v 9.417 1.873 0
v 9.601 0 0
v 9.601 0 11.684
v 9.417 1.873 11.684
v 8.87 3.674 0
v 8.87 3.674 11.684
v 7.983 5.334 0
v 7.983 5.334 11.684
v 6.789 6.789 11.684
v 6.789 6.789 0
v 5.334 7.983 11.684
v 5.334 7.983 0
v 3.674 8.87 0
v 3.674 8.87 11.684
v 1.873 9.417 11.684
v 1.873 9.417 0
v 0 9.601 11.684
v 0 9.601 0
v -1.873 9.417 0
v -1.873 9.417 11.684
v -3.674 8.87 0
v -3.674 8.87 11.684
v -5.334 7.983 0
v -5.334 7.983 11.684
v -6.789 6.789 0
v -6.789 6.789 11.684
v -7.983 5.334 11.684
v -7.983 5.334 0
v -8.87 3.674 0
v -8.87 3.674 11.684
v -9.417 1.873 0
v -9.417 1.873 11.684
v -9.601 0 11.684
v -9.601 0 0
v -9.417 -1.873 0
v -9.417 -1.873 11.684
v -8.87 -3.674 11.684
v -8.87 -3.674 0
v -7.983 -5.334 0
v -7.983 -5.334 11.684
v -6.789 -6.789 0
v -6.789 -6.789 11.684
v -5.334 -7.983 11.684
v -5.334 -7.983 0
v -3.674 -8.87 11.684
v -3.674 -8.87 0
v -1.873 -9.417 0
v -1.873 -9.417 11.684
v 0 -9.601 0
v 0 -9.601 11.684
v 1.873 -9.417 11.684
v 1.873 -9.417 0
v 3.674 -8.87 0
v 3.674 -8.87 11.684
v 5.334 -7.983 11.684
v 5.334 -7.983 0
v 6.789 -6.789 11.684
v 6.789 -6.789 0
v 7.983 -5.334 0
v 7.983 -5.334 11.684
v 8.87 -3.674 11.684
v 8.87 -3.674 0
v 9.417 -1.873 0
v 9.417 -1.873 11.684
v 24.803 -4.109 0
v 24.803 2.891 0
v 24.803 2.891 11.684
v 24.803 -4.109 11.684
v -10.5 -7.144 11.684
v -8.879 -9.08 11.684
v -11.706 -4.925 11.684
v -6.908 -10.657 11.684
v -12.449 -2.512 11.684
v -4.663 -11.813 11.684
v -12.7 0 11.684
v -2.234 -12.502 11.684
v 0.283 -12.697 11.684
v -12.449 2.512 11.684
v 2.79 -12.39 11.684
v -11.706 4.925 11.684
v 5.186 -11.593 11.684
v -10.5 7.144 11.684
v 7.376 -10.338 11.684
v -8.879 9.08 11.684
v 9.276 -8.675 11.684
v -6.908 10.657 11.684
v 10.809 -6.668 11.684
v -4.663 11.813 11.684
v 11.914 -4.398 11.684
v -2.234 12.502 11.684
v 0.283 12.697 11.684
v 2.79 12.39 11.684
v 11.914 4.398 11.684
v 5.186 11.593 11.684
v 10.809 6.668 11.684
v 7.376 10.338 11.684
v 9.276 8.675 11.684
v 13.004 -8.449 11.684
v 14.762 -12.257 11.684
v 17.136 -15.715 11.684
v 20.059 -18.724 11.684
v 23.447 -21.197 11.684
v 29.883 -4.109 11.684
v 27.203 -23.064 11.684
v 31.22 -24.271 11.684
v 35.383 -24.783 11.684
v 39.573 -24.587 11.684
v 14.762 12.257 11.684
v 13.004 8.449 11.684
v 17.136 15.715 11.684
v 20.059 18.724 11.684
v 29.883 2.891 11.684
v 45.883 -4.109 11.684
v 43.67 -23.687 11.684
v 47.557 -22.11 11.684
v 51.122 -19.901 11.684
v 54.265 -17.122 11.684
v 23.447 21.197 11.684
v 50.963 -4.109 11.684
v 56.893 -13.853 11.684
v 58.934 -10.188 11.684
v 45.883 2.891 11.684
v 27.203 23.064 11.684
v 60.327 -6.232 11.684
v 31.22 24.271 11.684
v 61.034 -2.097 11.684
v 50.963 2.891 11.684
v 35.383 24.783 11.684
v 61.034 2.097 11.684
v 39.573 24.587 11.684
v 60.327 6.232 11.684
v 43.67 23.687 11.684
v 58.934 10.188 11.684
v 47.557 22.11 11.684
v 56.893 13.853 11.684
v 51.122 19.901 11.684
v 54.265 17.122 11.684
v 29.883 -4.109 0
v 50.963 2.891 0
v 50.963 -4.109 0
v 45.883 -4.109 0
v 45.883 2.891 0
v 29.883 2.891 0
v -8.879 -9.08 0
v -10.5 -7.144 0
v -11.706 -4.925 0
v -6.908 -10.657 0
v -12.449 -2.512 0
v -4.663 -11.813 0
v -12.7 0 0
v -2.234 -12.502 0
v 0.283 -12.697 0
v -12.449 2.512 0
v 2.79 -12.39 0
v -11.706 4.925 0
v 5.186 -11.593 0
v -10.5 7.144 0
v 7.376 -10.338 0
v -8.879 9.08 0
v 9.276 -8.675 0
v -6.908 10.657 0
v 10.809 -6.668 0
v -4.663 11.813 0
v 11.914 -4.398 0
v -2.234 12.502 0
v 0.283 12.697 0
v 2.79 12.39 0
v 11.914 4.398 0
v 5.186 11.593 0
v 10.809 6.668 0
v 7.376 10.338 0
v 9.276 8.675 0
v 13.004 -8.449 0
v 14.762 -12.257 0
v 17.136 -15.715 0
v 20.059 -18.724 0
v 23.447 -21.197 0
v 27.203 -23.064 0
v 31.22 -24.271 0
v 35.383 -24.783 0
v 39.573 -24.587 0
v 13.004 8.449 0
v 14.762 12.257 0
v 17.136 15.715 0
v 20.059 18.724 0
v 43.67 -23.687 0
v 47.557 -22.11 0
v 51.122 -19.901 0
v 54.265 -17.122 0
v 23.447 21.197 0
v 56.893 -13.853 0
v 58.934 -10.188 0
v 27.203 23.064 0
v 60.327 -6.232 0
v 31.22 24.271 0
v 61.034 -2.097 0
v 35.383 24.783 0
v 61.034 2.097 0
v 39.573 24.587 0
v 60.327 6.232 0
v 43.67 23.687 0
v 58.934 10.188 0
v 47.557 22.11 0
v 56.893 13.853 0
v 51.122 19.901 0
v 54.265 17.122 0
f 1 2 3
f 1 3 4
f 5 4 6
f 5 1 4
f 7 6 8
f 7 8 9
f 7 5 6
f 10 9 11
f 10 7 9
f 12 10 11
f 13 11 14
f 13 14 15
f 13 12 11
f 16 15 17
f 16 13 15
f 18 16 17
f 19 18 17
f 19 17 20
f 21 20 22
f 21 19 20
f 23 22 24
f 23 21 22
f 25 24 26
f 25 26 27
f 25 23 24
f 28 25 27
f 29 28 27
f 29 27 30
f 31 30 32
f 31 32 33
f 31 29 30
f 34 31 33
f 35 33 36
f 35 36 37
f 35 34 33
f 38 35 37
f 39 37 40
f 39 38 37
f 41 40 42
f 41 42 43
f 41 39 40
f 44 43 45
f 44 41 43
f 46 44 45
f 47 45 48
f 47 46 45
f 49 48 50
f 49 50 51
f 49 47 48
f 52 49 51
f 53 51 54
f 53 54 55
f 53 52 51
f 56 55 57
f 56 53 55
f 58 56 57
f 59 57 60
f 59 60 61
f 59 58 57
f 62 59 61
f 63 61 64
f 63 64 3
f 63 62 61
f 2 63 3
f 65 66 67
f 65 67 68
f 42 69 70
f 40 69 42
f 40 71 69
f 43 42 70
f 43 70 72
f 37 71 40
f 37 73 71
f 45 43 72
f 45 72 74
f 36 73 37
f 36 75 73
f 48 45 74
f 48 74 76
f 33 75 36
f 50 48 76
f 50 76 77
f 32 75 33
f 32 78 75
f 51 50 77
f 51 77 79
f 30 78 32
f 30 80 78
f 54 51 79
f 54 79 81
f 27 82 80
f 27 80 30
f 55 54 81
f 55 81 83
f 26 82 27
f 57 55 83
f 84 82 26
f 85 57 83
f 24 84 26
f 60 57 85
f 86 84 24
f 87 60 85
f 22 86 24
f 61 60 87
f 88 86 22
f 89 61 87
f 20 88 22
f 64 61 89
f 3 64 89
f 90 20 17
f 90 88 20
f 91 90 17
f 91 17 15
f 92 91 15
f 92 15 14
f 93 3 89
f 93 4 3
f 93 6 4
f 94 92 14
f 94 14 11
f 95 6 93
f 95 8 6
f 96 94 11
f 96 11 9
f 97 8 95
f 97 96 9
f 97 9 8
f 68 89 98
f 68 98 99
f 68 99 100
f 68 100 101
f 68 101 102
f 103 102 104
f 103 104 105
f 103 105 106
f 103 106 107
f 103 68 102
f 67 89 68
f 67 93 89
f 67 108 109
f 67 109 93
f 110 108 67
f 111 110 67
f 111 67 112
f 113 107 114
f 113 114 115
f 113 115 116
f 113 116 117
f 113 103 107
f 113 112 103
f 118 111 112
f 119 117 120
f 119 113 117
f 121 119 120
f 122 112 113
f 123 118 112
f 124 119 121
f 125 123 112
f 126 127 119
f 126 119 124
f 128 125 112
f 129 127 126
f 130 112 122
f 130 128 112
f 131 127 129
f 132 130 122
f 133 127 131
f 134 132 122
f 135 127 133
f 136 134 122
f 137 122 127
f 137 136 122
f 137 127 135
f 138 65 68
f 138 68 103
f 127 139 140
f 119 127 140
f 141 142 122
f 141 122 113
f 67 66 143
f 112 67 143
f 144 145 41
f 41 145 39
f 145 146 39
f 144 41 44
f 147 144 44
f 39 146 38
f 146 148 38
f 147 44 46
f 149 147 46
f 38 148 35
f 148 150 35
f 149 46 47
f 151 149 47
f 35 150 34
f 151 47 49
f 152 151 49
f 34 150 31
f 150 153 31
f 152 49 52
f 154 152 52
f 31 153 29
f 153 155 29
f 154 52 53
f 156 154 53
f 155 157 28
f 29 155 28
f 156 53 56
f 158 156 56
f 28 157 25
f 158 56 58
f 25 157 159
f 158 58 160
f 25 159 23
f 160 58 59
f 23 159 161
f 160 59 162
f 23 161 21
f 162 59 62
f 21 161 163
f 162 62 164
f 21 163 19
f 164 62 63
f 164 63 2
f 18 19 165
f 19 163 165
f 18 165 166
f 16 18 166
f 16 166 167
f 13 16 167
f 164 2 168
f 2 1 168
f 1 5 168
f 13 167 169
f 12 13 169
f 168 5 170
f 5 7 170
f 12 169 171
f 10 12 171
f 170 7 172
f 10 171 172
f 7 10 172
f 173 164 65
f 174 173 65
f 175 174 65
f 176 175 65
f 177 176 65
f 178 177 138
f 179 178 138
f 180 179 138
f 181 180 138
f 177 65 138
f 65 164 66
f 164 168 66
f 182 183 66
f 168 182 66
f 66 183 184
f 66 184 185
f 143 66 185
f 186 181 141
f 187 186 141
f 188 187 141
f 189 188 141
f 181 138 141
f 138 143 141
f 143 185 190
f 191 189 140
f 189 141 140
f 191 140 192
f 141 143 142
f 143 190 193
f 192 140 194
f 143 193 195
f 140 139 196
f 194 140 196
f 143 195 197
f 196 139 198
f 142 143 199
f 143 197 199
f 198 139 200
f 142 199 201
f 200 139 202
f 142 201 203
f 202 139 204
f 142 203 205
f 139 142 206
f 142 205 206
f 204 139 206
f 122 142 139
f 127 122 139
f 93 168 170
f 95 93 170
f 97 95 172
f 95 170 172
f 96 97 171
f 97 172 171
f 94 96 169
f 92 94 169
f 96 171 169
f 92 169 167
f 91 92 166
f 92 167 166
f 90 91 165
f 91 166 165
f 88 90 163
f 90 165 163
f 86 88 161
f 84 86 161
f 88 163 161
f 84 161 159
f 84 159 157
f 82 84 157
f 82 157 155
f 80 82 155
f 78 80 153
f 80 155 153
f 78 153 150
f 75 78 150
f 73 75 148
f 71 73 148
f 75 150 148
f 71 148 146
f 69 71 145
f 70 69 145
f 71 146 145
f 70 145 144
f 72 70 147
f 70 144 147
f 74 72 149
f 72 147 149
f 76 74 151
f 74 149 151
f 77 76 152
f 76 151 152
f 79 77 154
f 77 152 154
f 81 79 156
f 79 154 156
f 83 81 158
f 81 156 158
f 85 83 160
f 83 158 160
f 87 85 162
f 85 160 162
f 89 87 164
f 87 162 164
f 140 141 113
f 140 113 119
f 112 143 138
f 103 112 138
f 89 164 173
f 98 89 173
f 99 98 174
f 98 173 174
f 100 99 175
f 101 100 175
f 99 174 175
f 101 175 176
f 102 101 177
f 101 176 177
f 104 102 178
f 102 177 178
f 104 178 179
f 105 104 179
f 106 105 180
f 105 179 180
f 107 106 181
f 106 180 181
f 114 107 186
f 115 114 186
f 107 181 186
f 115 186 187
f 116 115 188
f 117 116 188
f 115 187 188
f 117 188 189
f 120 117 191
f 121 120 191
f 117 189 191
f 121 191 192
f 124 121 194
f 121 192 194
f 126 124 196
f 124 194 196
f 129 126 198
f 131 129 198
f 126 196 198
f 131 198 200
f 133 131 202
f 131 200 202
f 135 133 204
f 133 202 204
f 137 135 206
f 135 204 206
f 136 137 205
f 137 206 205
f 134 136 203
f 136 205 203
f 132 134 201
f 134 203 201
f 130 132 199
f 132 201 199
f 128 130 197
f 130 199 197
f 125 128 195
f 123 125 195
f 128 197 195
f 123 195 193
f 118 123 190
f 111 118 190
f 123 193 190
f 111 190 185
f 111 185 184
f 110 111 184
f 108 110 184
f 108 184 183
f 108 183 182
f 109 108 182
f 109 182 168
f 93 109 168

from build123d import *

# Parameters (mm, degrees)
F0_R     = 9.6012
F1_DEPTH = 11.684
F2_W     = 5.08
F2_H     = 7
F3_DEPTH = 25.4


with BuildPart() as f1:
    # F0 (on Top) → F1 (new body)
    with BuildSketch(Plane.XY):
        with BuildLine():
            ThreePointArc((11.914125, -4.398138), (61.122967, 0), (11.914125, 4.398138))
            ThreePointArc((11.914125, 4.398138), (-12.7, 0), (11.914125, -4.398138))
        make_face()
        Circle(F0_R, mode=Mode.SUBTRACT)
    extrude(amount=F1_DEPTH)

    # F2 (on face) → F3 (cut)
    with BuildSketch(Plane(origin=(0, 0, 0), x_dir=(1, 0, 0), z_dir=(0, 0, -1))):
        with Locations((27.342967, 0.609253)):
            Rectangle(F2_W, F2_H)
        with Locations((48.422967, 0.609253)):
            Rectangle(F2_W, F2_H)
    extrude(amount=-F3_DEPTH, mode=Mode.SUBTRACT)


solid = f1.part
